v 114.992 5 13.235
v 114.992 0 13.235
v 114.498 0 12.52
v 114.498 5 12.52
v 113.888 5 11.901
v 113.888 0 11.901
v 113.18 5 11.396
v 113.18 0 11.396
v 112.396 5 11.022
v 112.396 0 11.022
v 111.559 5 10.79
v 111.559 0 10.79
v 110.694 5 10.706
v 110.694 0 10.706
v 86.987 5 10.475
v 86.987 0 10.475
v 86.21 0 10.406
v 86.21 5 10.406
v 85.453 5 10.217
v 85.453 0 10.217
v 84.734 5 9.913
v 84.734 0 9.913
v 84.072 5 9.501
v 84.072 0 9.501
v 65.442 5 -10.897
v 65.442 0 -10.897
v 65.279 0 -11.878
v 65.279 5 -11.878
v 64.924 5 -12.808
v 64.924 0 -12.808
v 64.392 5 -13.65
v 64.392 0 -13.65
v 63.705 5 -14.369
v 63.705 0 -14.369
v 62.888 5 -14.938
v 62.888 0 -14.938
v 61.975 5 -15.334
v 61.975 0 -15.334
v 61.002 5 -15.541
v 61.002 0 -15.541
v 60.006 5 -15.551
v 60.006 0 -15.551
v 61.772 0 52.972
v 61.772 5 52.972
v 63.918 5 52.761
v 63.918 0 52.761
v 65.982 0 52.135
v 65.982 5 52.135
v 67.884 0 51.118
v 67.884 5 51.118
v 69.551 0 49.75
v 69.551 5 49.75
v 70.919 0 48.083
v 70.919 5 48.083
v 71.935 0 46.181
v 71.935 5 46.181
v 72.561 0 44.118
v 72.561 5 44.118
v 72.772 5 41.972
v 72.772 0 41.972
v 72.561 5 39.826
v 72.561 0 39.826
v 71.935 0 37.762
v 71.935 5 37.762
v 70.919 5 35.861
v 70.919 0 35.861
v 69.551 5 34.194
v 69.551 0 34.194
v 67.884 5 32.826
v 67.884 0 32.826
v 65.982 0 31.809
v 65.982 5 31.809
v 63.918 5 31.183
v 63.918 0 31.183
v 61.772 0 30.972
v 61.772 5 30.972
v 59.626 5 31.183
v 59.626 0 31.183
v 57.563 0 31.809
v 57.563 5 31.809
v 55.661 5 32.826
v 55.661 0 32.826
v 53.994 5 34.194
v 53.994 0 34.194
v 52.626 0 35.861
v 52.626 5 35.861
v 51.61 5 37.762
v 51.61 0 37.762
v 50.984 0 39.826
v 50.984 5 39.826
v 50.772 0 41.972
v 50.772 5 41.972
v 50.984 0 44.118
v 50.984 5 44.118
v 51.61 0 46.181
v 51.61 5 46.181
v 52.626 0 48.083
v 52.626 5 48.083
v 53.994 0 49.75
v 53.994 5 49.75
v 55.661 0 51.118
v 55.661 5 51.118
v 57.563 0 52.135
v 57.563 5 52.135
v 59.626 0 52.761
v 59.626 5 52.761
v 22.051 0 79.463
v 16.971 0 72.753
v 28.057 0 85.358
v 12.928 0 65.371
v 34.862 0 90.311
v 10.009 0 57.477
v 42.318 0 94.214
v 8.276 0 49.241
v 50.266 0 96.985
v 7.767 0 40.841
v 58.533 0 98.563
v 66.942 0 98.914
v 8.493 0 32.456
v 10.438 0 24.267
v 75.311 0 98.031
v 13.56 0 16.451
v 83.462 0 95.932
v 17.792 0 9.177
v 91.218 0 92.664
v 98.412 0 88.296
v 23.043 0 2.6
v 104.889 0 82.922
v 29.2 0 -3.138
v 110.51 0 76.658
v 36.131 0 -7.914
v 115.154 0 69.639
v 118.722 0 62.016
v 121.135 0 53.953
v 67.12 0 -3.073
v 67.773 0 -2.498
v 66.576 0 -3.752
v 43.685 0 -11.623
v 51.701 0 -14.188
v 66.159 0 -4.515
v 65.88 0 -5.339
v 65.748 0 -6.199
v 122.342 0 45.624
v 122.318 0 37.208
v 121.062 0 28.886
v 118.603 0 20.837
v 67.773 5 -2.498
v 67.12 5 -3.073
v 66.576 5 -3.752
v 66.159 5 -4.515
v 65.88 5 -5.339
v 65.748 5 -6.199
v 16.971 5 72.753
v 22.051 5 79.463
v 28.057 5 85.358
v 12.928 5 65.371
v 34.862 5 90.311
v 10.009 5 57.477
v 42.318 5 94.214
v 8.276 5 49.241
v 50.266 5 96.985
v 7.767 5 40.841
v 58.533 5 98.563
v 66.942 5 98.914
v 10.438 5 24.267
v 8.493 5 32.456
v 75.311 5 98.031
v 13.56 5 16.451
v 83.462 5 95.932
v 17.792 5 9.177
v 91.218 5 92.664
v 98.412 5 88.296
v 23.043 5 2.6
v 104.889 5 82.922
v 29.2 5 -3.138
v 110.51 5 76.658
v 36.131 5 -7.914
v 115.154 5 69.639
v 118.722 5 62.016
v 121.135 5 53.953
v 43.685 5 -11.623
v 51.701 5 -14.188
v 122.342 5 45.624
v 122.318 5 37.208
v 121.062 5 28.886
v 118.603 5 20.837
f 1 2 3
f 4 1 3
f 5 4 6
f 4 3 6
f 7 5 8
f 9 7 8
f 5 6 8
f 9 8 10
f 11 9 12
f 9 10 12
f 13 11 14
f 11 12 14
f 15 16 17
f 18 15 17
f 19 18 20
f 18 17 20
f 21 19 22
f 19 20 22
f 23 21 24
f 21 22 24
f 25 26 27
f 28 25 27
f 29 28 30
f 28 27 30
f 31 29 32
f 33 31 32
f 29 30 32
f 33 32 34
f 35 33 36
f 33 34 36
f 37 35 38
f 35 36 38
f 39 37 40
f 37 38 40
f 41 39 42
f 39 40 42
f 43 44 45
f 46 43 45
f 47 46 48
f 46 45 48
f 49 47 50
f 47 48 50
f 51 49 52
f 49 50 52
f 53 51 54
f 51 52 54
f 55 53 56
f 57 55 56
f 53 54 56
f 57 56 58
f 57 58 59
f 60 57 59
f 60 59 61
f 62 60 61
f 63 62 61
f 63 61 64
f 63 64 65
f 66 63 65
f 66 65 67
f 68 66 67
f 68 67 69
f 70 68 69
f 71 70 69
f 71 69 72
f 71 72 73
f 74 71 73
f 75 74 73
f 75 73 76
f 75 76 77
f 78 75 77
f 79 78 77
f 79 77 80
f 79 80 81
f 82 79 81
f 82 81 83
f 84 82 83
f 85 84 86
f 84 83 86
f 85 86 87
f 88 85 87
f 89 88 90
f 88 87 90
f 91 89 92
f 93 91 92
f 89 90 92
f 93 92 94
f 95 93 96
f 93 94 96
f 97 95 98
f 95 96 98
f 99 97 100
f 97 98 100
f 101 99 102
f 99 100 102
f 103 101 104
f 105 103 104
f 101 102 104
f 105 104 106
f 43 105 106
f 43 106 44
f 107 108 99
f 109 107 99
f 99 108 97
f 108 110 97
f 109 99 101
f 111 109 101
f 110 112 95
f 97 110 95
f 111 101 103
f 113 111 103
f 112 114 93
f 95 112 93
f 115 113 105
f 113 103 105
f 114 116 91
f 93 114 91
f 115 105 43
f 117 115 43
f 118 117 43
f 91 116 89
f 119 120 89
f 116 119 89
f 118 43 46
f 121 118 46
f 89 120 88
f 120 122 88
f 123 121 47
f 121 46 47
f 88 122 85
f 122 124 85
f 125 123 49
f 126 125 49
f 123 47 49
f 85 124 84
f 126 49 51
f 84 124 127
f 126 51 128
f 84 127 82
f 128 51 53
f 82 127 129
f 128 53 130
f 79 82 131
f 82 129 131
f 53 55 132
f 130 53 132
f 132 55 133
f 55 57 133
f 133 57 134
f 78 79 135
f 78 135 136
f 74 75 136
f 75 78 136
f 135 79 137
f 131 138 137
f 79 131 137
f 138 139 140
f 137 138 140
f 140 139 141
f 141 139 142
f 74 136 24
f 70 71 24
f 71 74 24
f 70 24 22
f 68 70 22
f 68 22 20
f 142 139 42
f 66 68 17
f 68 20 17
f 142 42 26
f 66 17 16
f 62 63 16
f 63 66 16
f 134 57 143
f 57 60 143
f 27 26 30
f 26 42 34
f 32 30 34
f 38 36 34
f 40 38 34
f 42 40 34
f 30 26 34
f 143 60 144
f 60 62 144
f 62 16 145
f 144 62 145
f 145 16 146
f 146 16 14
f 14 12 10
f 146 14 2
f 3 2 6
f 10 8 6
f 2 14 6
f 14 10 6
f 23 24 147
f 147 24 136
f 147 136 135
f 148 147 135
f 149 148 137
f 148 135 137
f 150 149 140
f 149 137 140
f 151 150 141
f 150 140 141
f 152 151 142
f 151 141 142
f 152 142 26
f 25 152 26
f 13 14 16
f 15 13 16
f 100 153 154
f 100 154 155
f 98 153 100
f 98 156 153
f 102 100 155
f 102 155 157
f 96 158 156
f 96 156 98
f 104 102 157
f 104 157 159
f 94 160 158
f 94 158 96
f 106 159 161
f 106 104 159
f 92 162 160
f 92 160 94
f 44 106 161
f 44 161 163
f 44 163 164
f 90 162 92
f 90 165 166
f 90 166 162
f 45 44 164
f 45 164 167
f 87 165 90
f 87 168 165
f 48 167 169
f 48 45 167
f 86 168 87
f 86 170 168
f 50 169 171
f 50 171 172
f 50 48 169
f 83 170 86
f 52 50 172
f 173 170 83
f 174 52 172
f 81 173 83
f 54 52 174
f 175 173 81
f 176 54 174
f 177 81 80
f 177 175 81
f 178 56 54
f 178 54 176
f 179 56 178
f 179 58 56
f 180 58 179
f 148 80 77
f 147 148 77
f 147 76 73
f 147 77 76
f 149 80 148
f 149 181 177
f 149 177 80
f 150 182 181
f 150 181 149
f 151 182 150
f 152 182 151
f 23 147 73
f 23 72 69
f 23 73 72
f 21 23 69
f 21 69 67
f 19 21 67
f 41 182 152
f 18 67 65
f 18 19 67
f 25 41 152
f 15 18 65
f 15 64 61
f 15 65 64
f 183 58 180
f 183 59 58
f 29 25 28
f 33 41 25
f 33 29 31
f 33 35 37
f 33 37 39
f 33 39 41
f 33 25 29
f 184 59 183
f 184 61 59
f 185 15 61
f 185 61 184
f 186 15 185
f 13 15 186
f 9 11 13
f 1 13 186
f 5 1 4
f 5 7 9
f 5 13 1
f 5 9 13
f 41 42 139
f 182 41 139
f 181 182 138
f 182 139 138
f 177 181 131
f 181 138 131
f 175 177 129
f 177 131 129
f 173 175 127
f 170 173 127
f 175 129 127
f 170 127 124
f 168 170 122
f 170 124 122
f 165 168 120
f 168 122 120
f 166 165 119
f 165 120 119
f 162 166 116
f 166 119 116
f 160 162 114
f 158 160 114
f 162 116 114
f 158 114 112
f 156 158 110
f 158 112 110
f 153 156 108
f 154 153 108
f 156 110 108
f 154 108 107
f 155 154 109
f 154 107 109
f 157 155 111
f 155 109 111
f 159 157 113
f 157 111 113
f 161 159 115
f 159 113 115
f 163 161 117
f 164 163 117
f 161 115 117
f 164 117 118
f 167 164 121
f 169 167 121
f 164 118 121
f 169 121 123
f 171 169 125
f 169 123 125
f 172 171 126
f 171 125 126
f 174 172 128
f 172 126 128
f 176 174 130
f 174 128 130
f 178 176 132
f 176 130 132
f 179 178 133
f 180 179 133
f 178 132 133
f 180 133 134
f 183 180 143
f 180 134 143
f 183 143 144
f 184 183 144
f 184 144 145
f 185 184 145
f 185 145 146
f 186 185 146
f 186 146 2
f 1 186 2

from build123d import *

# Parameters (mm, degrees)
EXTRUDE_1_DEPTH     = 5
SKETCH_3_R          = 11
CUT_EXTRUDE_1_DEPTH = 158.534808963


with BuildPart() as part:
    # Эскиз1 → Вытянуть1 (new body)
    with BuildSketch(Plane(origin=(0, 0, 0), x_dir=(1, 0, 0), z_dir=(0, 1, 0))):
        with BuildLine():
            Line((110.693591381, -10.706034223), (86.987107148, -10.47450238))
            ThreePointArc((86.987107148, -10.47450238), (85.452697722, -10.217456373), (84.071576651, -9.501223505))
            Line((84.071576651, -9.501223505), (67.773001994, 2.498048819))
            ThreePointArc((67.773001994, 2.498048819), (66.350950932, 4.124659089), (65.74794659, 6.199382193))
            Line((65.74794659, 6.199382193), (65.441843699, 10.89653157))
            ThreePointArc((65.441843699, 10.89653157), (63.704749785, 14.369065402), (60.006376962, 15.55144645))
            ThreePointArc((60.006376962, 15.55144645), (38.518658839, -92.399615134), (114.99158645, -13.234944542))
            ThreePointArc((114.99158645, -13.234944542), (113.18036629, -11.396421777), (110.693591381, -10.706034223))
        make_face()
    extrude(amount=EXTRUDE_1_DEPTH)

    # Эскиз3 → Вырез-Вытянуть1 (cut, through all)
    with BuildSketch(Plane(origin=(0, 5, 0), x_dir=(1, 0, 0), z_dir=(0, 1, 0))):
        with Locations(Location((61.772466567, -41.971863474, 0), (0, 0, 270))):
            Circle(SKETCH_3_R)
    extrude(amount=-CUT_EXTRUDE_1_DEPTH, mode=Mode.SUBTRACT)


solid = part.part
